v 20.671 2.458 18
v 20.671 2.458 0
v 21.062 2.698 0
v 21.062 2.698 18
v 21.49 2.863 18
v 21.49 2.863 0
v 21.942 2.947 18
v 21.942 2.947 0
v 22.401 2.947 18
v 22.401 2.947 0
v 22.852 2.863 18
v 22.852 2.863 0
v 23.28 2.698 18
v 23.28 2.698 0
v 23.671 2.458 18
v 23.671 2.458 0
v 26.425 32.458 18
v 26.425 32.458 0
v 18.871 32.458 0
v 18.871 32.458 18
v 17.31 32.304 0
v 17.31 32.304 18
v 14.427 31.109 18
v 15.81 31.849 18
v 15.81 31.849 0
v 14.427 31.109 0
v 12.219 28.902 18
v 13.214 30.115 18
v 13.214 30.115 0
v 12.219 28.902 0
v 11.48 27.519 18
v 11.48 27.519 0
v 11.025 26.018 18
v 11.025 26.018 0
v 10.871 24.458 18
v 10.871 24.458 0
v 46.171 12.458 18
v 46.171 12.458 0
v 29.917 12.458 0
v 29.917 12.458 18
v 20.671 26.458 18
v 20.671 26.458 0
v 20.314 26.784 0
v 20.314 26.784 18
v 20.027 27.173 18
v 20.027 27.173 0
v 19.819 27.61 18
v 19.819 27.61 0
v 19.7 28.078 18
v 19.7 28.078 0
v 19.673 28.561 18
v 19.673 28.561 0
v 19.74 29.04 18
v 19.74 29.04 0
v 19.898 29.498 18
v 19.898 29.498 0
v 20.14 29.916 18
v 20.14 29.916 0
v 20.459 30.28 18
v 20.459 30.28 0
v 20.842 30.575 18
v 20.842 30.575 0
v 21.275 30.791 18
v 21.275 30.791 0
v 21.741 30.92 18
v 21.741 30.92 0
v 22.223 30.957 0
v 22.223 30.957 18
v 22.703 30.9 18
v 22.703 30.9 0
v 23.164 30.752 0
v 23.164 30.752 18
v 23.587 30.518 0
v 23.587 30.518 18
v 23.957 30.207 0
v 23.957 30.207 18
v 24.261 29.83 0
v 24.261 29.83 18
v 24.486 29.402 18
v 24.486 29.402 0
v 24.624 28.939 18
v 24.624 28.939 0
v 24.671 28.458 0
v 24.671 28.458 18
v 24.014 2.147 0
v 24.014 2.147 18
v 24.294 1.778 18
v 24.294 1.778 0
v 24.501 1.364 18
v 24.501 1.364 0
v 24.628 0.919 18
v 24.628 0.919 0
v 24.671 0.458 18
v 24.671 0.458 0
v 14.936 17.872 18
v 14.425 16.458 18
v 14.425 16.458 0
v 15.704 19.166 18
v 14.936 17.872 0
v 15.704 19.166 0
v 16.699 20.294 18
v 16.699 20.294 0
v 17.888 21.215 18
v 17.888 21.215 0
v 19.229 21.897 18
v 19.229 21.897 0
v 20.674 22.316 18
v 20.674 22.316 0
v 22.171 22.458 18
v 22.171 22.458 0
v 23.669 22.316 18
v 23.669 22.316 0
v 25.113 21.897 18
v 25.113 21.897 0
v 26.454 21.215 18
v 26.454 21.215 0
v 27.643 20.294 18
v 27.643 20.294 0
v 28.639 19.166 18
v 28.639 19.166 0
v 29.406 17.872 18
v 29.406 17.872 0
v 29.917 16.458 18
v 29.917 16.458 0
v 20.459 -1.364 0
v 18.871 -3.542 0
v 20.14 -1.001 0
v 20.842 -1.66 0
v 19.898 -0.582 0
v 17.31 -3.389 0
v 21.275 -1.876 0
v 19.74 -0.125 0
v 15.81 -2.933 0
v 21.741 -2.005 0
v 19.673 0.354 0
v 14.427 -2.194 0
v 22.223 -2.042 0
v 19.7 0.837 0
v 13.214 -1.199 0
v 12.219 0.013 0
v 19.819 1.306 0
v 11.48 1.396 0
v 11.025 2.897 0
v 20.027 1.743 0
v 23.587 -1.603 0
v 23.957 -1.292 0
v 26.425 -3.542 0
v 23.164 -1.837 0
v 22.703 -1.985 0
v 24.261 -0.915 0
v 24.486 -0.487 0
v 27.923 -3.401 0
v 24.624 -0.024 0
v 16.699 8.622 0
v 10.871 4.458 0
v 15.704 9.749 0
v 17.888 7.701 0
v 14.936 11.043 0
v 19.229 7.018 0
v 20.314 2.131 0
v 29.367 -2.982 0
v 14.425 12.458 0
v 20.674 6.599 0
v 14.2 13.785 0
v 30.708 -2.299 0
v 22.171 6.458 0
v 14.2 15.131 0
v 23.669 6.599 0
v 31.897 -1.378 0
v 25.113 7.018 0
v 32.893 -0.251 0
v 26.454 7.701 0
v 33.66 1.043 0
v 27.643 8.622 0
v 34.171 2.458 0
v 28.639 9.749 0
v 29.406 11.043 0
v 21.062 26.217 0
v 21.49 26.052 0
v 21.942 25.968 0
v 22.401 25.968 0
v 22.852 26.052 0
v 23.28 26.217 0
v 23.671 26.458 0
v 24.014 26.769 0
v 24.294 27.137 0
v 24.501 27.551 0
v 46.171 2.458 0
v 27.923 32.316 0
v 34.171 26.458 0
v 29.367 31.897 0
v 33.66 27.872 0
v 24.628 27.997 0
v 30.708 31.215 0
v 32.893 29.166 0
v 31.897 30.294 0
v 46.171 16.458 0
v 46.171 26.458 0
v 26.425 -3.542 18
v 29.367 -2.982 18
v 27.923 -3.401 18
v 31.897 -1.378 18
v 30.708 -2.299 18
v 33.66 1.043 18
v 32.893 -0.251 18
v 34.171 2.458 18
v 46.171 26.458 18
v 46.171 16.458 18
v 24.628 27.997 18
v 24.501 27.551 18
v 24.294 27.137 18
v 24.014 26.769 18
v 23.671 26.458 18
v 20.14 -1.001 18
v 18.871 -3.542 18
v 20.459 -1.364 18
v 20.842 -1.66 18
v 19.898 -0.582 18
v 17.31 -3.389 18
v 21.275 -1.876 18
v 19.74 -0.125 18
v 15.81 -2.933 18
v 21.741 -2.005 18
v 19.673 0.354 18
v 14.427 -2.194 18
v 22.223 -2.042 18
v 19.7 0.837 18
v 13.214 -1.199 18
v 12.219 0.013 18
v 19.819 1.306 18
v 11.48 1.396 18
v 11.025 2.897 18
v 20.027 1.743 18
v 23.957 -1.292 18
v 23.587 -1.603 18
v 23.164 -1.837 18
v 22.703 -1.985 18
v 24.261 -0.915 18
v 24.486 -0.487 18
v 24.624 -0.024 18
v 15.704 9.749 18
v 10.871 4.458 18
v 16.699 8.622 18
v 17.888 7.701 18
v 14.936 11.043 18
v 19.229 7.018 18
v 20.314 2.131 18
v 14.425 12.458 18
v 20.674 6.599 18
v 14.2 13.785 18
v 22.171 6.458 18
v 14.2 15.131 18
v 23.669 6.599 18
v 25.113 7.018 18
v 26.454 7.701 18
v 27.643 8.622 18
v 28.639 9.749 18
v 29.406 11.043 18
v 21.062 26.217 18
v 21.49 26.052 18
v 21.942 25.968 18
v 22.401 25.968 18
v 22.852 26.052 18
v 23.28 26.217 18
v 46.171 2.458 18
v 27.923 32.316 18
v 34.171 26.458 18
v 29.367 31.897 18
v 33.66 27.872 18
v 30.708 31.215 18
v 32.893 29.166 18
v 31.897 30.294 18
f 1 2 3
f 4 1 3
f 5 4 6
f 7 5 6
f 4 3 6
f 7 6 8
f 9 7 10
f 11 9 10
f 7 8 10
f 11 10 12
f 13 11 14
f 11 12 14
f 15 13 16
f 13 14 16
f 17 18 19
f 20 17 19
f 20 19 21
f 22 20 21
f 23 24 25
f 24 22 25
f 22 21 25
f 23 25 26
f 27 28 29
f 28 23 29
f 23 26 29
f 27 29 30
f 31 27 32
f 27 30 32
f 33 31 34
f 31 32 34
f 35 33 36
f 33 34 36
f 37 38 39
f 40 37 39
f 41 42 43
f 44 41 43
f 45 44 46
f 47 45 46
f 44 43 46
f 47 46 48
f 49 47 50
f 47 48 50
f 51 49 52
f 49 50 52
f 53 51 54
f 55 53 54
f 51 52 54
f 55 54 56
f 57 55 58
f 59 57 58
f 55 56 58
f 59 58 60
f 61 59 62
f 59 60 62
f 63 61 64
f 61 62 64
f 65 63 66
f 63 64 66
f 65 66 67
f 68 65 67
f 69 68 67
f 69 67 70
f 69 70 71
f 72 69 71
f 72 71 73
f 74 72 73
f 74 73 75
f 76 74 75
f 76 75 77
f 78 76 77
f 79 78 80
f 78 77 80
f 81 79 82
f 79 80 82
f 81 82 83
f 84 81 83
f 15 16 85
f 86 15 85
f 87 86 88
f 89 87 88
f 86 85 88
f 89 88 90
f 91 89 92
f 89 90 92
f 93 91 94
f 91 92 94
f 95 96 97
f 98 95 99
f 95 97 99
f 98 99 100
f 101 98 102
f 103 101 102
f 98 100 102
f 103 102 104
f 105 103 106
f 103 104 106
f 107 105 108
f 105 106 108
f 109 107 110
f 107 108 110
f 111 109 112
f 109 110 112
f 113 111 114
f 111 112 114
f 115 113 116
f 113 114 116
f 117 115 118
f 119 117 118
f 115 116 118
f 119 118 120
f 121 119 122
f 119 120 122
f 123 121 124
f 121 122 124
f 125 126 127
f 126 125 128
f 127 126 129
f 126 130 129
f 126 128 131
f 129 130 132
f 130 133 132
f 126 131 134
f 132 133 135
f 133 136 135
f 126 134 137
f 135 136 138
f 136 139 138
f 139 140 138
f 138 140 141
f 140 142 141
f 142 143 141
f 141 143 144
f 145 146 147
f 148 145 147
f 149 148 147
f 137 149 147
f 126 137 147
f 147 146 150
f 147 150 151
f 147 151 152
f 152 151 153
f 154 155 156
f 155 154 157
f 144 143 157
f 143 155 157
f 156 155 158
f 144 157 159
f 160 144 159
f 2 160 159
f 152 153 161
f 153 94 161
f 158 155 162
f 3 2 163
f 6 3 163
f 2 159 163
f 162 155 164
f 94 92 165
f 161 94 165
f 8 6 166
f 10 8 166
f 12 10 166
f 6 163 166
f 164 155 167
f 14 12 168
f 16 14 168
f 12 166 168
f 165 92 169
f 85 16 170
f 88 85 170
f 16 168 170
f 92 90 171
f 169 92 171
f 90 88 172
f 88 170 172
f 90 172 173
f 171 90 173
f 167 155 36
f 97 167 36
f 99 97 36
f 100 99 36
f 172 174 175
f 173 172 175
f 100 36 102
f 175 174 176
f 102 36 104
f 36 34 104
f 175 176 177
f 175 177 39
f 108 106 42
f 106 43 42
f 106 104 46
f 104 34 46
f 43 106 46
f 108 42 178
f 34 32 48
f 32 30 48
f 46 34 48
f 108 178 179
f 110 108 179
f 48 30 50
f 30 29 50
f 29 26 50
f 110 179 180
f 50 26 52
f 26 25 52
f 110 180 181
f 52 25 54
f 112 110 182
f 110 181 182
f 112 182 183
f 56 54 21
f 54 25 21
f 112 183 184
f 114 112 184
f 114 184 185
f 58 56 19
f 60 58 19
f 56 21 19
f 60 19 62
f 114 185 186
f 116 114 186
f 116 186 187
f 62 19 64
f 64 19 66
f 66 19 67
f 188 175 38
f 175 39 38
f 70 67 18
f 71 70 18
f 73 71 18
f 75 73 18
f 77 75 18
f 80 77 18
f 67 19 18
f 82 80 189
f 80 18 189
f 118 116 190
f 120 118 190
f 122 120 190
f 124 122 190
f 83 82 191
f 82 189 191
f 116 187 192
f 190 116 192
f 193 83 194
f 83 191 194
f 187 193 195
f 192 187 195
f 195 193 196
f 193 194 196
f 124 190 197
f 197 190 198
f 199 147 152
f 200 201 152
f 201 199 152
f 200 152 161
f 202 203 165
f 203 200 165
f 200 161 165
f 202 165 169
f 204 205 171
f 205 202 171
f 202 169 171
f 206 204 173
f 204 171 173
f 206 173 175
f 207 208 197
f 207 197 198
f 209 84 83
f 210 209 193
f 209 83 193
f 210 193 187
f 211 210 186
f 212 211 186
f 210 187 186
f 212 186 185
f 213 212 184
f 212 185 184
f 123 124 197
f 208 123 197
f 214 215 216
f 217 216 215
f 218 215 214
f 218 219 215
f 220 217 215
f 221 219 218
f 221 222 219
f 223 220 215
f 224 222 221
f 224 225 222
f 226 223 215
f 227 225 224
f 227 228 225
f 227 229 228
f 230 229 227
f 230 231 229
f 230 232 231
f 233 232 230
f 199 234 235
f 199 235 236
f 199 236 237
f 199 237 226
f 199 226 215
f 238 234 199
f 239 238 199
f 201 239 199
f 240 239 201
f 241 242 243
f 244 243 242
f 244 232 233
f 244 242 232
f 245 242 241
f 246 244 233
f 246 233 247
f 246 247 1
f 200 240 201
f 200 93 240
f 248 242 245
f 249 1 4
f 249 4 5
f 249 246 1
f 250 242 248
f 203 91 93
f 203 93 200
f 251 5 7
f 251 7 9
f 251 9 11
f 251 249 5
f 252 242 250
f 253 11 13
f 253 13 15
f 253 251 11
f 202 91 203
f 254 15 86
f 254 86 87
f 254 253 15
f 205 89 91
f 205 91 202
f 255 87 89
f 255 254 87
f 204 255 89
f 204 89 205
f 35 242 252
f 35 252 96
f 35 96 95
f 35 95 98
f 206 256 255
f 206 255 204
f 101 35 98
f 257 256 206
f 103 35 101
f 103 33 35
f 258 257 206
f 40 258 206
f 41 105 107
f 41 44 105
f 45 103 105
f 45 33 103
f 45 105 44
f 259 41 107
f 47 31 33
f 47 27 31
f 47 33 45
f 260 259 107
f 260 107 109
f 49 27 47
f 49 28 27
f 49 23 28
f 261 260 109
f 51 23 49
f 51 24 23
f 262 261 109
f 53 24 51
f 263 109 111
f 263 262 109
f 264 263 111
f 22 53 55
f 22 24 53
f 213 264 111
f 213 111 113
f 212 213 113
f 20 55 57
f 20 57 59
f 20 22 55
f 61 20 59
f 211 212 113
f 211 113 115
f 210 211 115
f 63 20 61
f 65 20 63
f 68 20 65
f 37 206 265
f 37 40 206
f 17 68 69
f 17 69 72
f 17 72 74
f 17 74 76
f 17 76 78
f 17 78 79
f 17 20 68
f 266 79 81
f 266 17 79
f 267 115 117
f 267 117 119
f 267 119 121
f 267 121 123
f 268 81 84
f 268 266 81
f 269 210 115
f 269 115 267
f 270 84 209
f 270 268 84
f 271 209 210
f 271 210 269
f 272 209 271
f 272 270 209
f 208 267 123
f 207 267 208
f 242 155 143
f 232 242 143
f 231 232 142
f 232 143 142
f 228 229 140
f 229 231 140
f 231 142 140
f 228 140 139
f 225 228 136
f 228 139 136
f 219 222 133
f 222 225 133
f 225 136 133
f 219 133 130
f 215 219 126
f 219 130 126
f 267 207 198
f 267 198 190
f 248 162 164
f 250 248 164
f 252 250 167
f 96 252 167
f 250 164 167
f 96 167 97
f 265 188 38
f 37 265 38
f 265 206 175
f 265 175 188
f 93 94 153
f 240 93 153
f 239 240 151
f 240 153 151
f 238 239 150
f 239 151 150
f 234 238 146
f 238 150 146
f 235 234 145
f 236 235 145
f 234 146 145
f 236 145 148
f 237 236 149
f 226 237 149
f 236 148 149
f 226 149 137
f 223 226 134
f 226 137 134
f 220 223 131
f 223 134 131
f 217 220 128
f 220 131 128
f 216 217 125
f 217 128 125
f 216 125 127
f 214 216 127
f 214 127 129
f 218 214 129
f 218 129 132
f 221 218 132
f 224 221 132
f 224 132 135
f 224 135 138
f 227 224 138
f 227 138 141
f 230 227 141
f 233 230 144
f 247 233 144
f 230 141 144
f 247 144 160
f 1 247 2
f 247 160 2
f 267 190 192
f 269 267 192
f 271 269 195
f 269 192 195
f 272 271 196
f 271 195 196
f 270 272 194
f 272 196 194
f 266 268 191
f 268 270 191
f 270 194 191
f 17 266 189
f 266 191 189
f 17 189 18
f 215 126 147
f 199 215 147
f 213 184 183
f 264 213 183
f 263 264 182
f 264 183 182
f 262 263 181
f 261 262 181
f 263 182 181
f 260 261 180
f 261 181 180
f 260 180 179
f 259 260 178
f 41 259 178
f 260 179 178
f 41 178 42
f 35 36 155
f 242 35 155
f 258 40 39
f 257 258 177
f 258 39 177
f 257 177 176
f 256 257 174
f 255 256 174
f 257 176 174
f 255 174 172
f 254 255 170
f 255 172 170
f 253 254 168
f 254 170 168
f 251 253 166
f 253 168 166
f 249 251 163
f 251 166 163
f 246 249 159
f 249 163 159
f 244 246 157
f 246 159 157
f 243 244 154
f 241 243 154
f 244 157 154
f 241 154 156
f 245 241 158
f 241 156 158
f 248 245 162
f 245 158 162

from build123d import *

# Parameters (mm, degrees)
F0_W        = 12
F0_H        = 10
F1_DEPTH    = 18
F2_T1_DEPTH = 56.7298334621
F2_T3_DEPTH = 58


# Not quite as in the source:
# - a fillet or chamfer that OpenCascade refuses, or shapes differently, is made with other operations: its cross-section is extruded or revolved along the edge and cut away or added


with BuildPart() as f1:
    # F0 (on Top) → F1 (new body)
    with BuildSketch(Plane.XY):
        with BuildLine():
            ThreePointArc((14.4251908534, 16.4576590359), (22.1711575458, 22.4576590359), (29.9171242382, 16.4576590359))
            Line((29.9171242382, 16.4576590359), (34.1711575458, 16.4576590359))
            Line((34.1711575458, 16.4576590359), (34.1711575458, 26.4576590359))
            Line((34.1711575458, 26.4576590359), (23.6711575458, 26.4576590359))
            ThreePointArc((23.6711575458, 26.4576590359), (22.1711575458, 25.9576590359), (20.6711575458, 26.4576590359))
            Line((20.6711575458, 26.4576590359), (10.8711575458, 26.4576590359))
            Line((10.8711575458, 26.4576590359), (10.8711575458, 16.4576590359))
            Line((10.8711575458, 16.4576590359), (14.4251908534, 16.4576590359))
        make_face()
        with BuildLine():
            Line((34.1711575458, 12.4576590359), (29.9171242382, 12.4576590359))
            ThreePointArc((29.9171242382, 12.4576590359), (22.1711575458, 6.4576590359), (14.4251908534, 12.4576590359))
            Line((14.4251908534, 12.4576590359), (10.8711575458, 12.4576590359))
            Line((10.8711575458, 12.4576590359), (10.8711575458, 2.4576590359))
            Line((10.8711575458, 2.4576590359), (20.6711575458, 2.4576590359))
            ThreePointArc((20.6711575458, 2.4576590359), (22.1711575458, 2.9576590359), (23.6711575458, 2.4576590359))
            Line((23.6711575458, 2.4576590359), (34.1711575458, 2.4576590359))
            Line((34.1711575458, 2.4576590359), (34.1711575458, 12.4576590359))
        make_face()
        with BuildLine():
            ThreePointArc((14.4251908534, 12.4576590359), (14.1711575458, 14.4576590359), (14.4251908534, 16.4576590359))
            Line((14.4251908534, 16.4576590359), (10.8711575458, 16.4576590359))
            Line((10.8711575458, 16.4576590359), (10.8711575458, 12.4576590359))
            Line((10.8711575458, 12.4576590359), (14.4251908534, 12.4576590359))
        make_face()
        with Locations((40.1711575458, 21.4576590359)):
            Rectangle(F0_W, F0_H)
        with Locations((40.1711575458, 7.4576590359)):
            Rectangle(F0_W, F0_H)
        with BuildLine():
            Line((23.6711575458, 26.4576590359), (34.1711575458, 26.4576590359))
            Line((34.1711575458, 26.4576590359), (34.1711575458, 32.4576590359))
            Line((34.1711575458, 32.4576590359), (10.8711575458, 32.4576590359))
            Line((10.8711575458, 32.4576590359), (10.8711575458, 26.4576590359))
            Line((10.8711575458, 26.4576590359), (20.6711575458, 26.4576590359))
            ThreePointArc((20.6711575458, 26.4576590359), (21.0531235571, 30.6937270134), (24.6711575458, 28.4576590359))
            ThreePointArc((24.6711575458, 28.4576590359), (24.4072255233, 27.3396250472), (23.6711575458, 26.4576590359))
        make_face()
        with BuildLine():
            Line((34.1711575458, -3.5423409641), (34.1711575458, 2.4576590359))
            Line((34.1711575458, 2.4576590359), (23.6711575458, 2.4576590359))
            ThreePointArc((23.6711575458, 2.4576590359), (24.4072255233, 1.5756930247), (24.6711575458, 0.4576590359))
            ThreePointArc((24.6711575458, 0.4576590359), (21.0531235571, -1.7784089416), (20.6711575458, 2.4576590359))
            Line((20.6711575458, 2.4576590359), (10.8711575458, 2.4576590359))
            Line((10.8711575458, 2.4576590359), (10.8711575458, -3.5423409641))
            Line((10.8711575458, -3.5423409641), (34.1711575458, -3.5423409641))
        make_face()
    extrude(amount=F1_DEPTH)

    # F2: fillet of radius 8 on 4 edges, made by hand

    # F2_s2 → F2_t1 (cut)
    with BuildSketch(Plane.XY.offset(-19.364916731)):
        with BuildLine():
            ThreePointArc((34.1711575458, 26.4576590359), (31.324170339, 30.7822143563), (26.4251908534, 32.4576590359))
            Line((26.4251908534, 32.4576590359), (34.1711575458, 32.4576590359))
            Line((34.1711575458, 32.4576590359), (34.1711575458, 26.4576590359))
        make_face()
        with BuildLine():
            ThreePointArc((26.4251908534, -3.5423409641), (31.324170339, -1.8668962844), (34.1711575458, 2.4576590359))
            Line((34.1711575458, 2.4576590359), (34.1711575458, -3.5423409641))
            Line((34.1711575458, -3.5423409641), (26.4251908534, -3.5423409641))
        make_face()
    extrude(amount=F2_T1_DEPTH, mode=Mode.SUBTRACT)

    # F2_s4 → F2_t3 (cut)
    with BuildSketch(Plane.XY.offset(-20)):
        with BuildLine():
            ThreePointArc((10.8711575458, 4.4576590359), (13.2143032963, -1.1991952136), (18.8711575458, -3.5423409641))
            Line((18.8711575458, -3.5423409641), (10.8711575458, -3.5423409641))
            Line((10.8711575458, -3.5423409641), (10.8711575458, 4.4576590359))
        make_face()
        with BuildLine():
            ThreePointArc((18.8711575458, 32.4576590359), (13.2143032963, 30.1145132854), (10.8711575458, 24.4576590359))
            Line((10.8711575458, 24.4576590359), (10.8711575458, 32.4576590359))
            Line((10.8711575458, 32.4576590359), (18.8711575458, 32.4576590359))
        make_face()
    extrude(amount=F2_T3_DEPTH, mode=Mode.SUBTRACT)


solid = f1.part
